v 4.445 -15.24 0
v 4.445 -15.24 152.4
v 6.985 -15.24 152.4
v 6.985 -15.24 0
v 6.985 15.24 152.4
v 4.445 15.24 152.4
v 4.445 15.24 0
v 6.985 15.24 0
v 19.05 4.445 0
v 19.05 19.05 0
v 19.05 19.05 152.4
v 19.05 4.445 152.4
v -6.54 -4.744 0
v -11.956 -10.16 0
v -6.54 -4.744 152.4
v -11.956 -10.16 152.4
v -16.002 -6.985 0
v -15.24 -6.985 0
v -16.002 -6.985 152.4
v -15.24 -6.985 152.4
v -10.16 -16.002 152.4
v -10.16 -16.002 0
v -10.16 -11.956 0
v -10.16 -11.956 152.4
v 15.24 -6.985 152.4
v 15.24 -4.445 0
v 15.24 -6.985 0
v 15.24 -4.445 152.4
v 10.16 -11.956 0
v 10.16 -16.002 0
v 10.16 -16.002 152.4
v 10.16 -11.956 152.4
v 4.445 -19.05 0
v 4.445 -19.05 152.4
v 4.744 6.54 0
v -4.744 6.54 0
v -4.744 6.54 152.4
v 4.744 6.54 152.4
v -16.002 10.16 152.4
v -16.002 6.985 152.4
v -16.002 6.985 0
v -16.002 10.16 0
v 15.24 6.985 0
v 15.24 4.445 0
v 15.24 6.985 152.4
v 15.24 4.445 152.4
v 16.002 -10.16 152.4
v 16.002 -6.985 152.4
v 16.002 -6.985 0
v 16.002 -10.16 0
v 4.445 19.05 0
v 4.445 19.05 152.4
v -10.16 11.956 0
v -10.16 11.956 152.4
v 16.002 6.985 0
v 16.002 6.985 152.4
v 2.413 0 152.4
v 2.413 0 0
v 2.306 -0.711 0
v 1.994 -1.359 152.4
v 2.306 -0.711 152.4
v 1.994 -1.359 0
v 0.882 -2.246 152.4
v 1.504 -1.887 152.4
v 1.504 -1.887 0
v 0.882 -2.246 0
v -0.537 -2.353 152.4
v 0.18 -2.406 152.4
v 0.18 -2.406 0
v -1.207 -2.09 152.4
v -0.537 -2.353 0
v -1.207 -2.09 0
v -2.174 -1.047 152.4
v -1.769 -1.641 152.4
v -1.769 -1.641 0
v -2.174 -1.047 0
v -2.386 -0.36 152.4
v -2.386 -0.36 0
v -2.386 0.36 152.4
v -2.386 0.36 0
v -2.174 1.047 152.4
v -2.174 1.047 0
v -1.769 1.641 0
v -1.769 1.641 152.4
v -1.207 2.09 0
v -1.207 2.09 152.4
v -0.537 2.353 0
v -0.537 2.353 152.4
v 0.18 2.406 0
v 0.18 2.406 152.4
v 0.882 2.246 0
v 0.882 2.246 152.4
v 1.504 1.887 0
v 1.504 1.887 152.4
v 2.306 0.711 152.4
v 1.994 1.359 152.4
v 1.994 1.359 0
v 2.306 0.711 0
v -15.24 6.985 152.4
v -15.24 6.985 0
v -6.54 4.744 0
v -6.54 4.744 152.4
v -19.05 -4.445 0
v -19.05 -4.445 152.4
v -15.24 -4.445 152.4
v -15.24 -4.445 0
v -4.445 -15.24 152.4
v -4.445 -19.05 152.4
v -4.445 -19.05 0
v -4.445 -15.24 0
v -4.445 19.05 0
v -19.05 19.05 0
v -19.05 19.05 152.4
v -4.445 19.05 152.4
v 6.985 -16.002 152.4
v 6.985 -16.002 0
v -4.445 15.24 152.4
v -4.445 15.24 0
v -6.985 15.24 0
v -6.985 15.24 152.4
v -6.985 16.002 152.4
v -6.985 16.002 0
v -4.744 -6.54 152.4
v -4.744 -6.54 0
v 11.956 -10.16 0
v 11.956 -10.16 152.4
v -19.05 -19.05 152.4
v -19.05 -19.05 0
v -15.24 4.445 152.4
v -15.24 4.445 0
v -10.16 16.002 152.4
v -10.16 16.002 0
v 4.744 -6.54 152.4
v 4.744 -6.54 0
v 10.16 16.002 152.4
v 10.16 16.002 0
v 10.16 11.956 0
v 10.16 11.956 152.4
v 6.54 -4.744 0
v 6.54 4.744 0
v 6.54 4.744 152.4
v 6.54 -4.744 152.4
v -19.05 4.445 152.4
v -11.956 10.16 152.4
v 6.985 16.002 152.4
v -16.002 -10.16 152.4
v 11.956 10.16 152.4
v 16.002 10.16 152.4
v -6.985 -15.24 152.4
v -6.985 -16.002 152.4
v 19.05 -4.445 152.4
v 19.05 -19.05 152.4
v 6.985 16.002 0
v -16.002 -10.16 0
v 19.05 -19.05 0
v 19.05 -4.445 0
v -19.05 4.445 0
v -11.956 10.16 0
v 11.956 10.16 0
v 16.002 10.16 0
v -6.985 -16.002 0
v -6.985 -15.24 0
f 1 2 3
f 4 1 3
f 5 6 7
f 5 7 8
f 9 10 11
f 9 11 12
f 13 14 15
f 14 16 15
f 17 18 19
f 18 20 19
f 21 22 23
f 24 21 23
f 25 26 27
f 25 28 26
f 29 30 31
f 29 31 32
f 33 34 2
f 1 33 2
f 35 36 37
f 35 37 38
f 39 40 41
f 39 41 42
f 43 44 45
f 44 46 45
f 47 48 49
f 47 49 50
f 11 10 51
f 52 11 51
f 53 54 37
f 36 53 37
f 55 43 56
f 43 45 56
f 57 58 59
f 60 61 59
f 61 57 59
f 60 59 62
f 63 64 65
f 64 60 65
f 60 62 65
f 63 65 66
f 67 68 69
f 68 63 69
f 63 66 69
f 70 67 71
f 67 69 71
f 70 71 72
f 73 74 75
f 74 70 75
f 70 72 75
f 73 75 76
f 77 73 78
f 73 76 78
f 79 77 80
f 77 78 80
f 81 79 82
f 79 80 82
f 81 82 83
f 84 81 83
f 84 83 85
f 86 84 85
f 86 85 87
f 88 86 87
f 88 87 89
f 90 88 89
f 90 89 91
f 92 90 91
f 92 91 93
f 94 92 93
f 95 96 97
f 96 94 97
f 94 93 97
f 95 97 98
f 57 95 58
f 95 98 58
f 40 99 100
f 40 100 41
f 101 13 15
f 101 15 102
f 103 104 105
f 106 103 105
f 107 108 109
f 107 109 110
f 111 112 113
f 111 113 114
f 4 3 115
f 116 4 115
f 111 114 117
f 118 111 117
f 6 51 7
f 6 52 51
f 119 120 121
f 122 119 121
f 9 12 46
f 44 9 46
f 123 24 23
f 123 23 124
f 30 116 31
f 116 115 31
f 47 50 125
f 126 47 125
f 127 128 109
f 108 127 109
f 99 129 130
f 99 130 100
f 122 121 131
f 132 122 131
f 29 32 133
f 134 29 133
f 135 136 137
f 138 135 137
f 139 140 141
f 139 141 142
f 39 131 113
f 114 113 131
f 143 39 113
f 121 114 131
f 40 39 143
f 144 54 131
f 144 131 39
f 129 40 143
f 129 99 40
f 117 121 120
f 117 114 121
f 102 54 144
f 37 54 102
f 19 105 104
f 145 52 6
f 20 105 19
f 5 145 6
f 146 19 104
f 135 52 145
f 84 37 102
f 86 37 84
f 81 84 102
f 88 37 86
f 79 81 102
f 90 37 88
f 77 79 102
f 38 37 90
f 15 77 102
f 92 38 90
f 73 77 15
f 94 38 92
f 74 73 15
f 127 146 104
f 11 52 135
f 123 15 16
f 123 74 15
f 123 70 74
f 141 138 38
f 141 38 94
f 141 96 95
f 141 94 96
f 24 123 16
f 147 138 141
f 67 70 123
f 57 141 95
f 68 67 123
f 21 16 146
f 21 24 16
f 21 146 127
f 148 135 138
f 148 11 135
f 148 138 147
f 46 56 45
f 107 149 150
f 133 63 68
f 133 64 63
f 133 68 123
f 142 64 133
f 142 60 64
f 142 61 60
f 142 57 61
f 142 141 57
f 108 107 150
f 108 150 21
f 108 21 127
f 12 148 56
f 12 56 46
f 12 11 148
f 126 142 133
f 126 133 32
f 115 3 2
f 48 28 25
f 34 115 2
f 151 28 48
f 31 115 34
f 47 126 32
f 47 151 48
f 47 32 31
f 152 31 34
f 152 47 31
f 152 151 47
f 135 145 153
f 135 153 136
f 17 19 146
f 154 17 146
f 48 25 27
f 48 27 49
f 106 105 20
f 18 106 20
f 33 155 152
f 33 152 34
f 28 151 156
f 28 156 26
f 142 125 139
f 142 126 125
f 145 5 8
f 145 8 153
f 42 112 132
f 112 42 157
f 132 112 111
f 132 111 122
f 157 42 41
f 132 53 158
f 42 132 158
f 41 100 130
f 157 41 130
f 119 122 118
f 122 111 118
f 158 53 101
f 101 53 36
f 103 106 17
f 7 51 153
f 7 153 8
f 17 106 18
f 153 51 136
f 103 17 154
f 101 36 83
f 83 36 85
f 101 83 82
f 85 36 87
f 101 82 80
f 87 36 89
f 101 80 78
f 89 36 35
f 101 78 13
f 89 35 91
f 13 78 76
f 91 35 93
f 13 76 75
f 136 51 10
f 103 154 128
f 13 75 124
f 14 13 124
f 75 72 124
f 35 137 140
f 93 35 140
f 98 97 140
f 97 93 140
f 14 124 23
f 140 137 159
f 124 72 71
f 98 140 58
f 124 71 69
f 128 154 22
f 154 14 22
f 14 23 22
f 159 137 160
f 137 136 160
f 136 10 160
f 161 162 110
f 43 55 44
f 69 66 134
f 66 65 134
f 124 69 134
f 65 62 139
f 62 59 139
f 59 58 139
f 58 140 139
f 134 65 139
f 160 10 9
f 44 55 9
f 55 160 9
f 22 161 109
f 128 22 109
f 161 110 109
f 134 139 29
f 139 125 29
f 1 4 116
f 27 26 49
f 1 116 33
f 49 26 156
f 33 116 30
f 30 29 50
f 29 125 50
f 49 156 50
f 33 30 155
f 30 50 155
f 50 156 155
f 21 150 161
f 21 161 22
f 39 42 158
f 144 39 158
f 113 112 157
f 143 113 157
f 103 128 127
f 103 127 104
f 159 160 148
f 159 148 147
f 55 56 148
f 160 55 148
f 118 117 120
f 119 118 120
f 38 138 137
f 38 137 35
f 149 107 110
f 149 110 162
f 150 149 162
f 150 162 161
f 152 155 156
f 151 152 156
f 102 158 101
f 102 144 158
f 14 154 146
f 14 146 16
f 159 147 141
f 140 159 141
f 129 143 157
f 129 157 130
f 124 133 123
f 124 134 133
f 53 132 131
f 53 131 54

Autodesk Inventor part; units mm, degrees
ref_plane "XY Plane" through (0, 0, 0) normal (0, 0, 1) x (1, 0, 0)
sketch "Sketch1" plane through (0, 0, 0) normal (0, 0, 1) x (1, 0, 0)
  line L0 (6.5405, -6.5405) -> (-6.5405, -6.5405)
  line L1 (-6.5405, -6.5405) -> (-6.5405, 6.5405)
  line L2 (-6.5405, 6.5405) -> (6.5405, 6.5405)
  line L3 (6.5405, 6.5405) -> (6.5405, -6.5405)
  line L4 (6.5405, -6.5405) -> (-6.5405, 6.5405) construction
  line L5 (-6.5405, -6.5405) -> (6.5405, 6.5405) construction
  circle A0 centre (0, 0) radius 2.413
  dimension "d0" = 13.081
  dimension "d1" = 4.826
extrude "Extrusion1" add sketch "Sketch1" along normal blind 152.4
sketch "Sketch2" plane through (0, 0, 152.4) normal (0, 0, 1) x (1, 0, 0)
  circle A0 centre (0, 0) radius 2.413 projected
  line L0 (6.5405, -6.5405) -> (6.5405, 6.5405) projected
  line L1 (19.05, 19.05) -> (19.05, 4.445)
  line L2 (19.05, 4.445) -> (15.24, 4.445)
  line L3 (11.9561, 10.16) -> (6.5405, 4.7444)
  line L4 (15.24, 4.445) -> (15.24, 6.985)
  line L5 (15.24, 6.985) -> (16.002, 6.985)
  line L6 (16.002, 6.985) -> (16.002, 10.16)
  line L7 (16.002, 10.16) -> (11.9561, 10.16)
  line L8 (19.05, 19.05) -> (6.5405, 6.5405) construction
  line L9 (19.05, 19.05) -> (4.445, 19.05)
  line L10 (4.445, 19.05) -> (4.445, 15.24)
  line L11 (10.16, 11.9561) -> (4.7444, 6.5405)
  line L12 (4.445, 15.24) -> (6.985, 15.24)
  line L13 (6.985, 15.24) -> (6.985, 16.002)
  line L14 (6.985, 16.002) -> (10.16, 16.002)
  line L15 (10.16, 16.002) -> (10.16, 11.9561)
  line L16 (4.7444, 6.5405) -> (6.5405, 6.5405)
  line L17 (6.5405, 6.5405) -> (6.5405, 4.7444)
  dimension "d5" = 45
  dimension "d6" = 14.605
  dimension "d7" = 3.81
  dimension "d8" = 3.048
  dimension "d10" = 19.05
  dimension "d13" = 8.89
  dimension "d14" = 1.27
  dimension "d15" = 3.175
extrude "Extrusion2" add sketch "Sketch2" against normal up to surface (152.4 mm away) contours L0 L16 L11 L15 L14 L13 L12 L10 L9 L1 L2 L4 L5 L6 L7 L3
pattern_circular "Circular Pattern1" count 4 over 360 about axis through (0, 0, 0) along (0, 0, 1) of "Extrusion2"
ref_plane "Work Plane1" through (0, 0, 0) normal (1, 0, 0) x (0, 1, 0)
ref_plane "Work Plane2" through (0, 0, 0) normal (0, 1, 0) x (1, 0, 0)
equation "\"d10\" = d9"
equation "\"d9\" = 19.05"
properties part number "1_5 80-20 x 6in" material "Gold"
